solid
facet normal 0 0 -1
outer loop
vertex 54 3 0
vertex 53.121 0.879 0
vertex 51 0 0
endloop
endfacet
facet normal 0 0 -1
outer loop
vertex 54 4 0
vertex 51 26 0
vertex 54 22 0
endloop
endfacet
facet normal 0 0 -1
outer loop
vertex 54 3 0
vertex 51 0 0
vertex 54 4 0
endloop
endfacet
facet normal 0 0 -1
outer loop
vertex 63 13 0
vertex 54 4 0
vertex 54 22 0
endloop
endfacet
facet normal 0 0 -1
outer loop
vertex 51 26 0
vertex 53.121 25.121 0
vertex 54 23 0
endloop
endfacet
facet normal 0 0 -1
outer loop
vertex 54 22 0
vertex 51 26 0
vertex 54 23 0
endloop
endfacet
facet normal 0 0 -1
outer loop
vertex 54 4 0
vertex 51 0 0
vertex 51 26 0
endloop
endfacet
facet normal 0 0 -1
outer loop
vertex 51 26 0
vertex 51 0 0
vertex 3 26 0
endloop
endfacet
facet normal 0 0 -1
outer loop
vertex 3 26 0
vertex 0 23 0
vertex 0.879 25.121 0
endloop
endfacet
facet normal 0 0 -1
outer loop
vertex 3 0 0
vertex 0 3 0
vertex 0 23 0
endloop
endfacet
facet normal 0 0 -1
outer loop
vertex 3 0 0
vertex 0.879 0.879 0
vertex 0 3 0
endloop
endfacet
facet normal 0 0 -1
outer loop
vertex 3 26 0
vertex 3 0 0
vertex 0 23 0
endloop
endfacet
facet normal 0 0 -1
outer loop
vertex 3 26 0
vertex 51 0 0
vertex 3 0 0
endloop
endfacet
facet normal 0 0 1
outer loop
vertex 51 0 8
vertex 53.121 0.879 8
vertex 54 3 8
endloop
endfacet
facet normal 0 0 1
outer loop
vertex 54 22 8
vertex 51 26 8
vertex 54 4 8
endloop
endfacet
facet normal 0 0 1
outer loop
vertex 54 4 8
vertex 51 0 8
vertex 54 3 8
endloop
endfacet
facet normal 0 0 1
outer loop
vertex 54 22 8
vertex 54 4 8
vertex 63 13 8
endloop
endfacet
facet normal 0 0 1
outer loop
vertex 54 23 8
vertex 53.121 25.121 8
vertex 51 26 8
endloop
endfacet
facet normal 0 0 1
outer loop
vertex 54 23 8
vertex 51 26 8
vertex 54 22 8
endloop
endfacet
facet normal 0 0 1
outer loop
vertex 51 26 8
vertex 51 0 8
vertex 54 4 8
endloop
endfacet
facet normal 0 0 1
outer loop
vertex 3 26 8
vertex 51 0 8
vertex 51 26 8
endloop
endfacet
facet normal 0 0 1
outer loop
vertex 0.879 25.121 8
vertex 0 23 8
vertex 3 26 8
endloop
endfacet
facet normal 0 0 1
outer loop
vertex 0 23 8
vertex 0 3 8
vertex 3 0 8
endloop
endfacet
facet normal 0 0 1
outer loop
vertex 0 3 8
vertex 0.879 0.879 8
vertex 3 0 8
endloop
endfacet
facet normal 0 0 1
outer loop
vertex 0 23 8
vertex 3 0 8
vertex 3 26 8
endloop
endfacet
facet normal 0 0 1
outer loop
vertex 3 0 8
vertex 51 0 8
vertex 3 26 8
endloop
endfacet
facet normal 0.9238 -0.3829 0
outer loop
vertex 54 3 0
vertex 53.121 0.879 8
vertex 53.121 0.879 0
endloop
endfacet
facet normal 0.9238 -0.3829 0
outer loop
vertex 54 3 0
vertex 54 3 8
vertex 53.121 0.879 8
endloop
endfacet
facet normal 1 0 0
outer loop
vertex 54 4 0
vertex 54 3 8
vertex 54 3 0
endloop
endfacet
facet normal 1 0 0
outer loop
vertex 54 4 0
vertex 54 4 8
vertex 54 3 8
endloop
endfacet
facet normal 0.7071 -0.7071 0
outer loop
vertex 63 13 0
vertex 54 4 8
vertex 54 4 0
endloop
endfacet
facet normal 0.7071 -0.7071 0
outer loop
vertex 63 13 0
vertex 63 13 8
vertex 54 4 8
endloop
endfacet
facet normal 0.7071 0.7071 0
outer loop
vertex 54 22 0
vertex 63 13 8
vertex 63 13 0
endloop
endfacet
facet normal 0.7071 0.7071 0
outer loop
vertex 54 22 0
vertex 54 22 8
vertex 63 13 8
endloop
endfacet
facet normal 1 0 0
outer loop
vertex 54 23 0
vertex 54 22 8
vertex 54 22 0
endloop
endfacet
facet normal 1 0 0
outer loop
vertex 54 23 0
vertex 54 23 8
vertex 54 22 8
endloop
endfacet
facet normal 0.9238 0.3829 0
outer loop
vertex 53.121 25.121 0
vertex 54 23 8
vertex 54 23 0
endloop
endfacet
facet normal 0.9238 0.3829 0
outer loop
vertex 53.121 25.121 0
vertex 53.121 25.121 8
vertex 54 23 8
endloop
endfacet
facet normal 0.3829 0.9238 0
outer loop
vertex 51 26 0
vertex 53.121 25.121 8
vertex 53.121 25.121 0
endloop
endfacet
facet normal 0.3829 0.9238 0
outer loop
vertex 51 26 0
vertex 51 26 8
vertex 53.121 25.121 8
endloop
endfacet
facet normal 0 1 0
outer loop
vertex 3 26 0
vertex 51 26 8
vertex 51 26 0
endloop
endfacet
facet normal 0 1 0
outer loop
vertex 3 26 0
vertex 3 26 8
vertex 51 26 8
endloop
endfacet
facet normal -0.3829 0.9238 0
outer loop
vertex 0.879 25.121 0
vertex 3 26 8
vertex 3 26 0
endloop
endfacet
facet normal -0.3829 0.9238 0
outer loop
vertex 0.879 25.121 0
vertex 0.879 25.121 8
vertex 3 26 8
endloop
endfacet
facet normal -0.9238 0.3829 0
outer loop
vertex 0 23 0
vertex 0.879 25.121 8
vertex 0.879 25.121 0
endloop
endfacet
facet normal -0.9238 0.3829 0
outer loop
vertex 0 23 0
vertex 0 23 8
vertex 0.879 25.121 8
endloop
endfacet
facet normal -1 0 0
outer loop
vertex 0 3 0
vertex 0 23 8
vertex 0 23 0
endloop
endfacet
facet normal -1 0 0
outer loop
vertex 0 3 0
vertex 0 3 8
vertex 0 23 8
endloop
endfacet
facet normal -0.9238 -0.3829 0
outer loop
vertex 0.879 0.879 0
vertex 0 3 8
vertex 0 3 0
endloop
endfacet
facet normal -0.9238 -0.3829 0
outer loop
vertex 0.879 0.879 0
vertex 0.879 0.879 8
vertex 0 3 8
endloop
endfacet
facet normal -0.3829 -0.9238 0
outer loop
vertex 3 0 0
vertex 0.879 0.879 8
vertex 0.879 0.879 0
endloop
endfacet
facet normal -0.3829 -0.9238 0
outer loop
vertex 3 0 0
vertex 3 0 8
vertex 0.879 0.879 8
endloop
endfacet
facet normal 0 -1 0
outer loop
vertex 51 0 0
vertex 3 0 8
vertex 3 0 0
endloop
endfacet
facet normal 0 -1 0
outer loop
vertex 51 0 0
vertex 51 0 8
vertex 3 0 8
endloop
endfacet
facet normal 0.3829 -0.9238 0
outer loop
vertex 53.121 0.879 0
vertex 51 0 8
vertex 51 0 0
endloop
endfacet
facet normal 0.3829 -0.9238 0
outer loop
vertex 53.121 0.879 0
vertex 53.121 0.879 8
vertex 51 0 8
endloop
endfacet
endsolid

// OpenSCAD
$fn = 32;

// ----------------------------------------------------------------------
// Ratchet pawl: 54 x 26 mm body, beak 9 mm с правого торца
// ----------------------------------------------------------------------

// --- parameters (mm) ---
profile_height = 8;       // extrusion height
profile_points = 15;      // points of the closed outline

profile = [[0, 3], [0.879, 0.879], [3, 0], [51, 0], [53.121, 0.879], [54, 3], [54, 4], [63, 13], [54, 22], [54, 23], [53.121, 25.121], [51, 26], [3, 26], [0.879, 25.121], [0, 23]];  // single closed polygon, 15 points, counter clockwise

// --- the one profile operation ---
linear_extrude(height = profile_height) polygon(points = profile);
